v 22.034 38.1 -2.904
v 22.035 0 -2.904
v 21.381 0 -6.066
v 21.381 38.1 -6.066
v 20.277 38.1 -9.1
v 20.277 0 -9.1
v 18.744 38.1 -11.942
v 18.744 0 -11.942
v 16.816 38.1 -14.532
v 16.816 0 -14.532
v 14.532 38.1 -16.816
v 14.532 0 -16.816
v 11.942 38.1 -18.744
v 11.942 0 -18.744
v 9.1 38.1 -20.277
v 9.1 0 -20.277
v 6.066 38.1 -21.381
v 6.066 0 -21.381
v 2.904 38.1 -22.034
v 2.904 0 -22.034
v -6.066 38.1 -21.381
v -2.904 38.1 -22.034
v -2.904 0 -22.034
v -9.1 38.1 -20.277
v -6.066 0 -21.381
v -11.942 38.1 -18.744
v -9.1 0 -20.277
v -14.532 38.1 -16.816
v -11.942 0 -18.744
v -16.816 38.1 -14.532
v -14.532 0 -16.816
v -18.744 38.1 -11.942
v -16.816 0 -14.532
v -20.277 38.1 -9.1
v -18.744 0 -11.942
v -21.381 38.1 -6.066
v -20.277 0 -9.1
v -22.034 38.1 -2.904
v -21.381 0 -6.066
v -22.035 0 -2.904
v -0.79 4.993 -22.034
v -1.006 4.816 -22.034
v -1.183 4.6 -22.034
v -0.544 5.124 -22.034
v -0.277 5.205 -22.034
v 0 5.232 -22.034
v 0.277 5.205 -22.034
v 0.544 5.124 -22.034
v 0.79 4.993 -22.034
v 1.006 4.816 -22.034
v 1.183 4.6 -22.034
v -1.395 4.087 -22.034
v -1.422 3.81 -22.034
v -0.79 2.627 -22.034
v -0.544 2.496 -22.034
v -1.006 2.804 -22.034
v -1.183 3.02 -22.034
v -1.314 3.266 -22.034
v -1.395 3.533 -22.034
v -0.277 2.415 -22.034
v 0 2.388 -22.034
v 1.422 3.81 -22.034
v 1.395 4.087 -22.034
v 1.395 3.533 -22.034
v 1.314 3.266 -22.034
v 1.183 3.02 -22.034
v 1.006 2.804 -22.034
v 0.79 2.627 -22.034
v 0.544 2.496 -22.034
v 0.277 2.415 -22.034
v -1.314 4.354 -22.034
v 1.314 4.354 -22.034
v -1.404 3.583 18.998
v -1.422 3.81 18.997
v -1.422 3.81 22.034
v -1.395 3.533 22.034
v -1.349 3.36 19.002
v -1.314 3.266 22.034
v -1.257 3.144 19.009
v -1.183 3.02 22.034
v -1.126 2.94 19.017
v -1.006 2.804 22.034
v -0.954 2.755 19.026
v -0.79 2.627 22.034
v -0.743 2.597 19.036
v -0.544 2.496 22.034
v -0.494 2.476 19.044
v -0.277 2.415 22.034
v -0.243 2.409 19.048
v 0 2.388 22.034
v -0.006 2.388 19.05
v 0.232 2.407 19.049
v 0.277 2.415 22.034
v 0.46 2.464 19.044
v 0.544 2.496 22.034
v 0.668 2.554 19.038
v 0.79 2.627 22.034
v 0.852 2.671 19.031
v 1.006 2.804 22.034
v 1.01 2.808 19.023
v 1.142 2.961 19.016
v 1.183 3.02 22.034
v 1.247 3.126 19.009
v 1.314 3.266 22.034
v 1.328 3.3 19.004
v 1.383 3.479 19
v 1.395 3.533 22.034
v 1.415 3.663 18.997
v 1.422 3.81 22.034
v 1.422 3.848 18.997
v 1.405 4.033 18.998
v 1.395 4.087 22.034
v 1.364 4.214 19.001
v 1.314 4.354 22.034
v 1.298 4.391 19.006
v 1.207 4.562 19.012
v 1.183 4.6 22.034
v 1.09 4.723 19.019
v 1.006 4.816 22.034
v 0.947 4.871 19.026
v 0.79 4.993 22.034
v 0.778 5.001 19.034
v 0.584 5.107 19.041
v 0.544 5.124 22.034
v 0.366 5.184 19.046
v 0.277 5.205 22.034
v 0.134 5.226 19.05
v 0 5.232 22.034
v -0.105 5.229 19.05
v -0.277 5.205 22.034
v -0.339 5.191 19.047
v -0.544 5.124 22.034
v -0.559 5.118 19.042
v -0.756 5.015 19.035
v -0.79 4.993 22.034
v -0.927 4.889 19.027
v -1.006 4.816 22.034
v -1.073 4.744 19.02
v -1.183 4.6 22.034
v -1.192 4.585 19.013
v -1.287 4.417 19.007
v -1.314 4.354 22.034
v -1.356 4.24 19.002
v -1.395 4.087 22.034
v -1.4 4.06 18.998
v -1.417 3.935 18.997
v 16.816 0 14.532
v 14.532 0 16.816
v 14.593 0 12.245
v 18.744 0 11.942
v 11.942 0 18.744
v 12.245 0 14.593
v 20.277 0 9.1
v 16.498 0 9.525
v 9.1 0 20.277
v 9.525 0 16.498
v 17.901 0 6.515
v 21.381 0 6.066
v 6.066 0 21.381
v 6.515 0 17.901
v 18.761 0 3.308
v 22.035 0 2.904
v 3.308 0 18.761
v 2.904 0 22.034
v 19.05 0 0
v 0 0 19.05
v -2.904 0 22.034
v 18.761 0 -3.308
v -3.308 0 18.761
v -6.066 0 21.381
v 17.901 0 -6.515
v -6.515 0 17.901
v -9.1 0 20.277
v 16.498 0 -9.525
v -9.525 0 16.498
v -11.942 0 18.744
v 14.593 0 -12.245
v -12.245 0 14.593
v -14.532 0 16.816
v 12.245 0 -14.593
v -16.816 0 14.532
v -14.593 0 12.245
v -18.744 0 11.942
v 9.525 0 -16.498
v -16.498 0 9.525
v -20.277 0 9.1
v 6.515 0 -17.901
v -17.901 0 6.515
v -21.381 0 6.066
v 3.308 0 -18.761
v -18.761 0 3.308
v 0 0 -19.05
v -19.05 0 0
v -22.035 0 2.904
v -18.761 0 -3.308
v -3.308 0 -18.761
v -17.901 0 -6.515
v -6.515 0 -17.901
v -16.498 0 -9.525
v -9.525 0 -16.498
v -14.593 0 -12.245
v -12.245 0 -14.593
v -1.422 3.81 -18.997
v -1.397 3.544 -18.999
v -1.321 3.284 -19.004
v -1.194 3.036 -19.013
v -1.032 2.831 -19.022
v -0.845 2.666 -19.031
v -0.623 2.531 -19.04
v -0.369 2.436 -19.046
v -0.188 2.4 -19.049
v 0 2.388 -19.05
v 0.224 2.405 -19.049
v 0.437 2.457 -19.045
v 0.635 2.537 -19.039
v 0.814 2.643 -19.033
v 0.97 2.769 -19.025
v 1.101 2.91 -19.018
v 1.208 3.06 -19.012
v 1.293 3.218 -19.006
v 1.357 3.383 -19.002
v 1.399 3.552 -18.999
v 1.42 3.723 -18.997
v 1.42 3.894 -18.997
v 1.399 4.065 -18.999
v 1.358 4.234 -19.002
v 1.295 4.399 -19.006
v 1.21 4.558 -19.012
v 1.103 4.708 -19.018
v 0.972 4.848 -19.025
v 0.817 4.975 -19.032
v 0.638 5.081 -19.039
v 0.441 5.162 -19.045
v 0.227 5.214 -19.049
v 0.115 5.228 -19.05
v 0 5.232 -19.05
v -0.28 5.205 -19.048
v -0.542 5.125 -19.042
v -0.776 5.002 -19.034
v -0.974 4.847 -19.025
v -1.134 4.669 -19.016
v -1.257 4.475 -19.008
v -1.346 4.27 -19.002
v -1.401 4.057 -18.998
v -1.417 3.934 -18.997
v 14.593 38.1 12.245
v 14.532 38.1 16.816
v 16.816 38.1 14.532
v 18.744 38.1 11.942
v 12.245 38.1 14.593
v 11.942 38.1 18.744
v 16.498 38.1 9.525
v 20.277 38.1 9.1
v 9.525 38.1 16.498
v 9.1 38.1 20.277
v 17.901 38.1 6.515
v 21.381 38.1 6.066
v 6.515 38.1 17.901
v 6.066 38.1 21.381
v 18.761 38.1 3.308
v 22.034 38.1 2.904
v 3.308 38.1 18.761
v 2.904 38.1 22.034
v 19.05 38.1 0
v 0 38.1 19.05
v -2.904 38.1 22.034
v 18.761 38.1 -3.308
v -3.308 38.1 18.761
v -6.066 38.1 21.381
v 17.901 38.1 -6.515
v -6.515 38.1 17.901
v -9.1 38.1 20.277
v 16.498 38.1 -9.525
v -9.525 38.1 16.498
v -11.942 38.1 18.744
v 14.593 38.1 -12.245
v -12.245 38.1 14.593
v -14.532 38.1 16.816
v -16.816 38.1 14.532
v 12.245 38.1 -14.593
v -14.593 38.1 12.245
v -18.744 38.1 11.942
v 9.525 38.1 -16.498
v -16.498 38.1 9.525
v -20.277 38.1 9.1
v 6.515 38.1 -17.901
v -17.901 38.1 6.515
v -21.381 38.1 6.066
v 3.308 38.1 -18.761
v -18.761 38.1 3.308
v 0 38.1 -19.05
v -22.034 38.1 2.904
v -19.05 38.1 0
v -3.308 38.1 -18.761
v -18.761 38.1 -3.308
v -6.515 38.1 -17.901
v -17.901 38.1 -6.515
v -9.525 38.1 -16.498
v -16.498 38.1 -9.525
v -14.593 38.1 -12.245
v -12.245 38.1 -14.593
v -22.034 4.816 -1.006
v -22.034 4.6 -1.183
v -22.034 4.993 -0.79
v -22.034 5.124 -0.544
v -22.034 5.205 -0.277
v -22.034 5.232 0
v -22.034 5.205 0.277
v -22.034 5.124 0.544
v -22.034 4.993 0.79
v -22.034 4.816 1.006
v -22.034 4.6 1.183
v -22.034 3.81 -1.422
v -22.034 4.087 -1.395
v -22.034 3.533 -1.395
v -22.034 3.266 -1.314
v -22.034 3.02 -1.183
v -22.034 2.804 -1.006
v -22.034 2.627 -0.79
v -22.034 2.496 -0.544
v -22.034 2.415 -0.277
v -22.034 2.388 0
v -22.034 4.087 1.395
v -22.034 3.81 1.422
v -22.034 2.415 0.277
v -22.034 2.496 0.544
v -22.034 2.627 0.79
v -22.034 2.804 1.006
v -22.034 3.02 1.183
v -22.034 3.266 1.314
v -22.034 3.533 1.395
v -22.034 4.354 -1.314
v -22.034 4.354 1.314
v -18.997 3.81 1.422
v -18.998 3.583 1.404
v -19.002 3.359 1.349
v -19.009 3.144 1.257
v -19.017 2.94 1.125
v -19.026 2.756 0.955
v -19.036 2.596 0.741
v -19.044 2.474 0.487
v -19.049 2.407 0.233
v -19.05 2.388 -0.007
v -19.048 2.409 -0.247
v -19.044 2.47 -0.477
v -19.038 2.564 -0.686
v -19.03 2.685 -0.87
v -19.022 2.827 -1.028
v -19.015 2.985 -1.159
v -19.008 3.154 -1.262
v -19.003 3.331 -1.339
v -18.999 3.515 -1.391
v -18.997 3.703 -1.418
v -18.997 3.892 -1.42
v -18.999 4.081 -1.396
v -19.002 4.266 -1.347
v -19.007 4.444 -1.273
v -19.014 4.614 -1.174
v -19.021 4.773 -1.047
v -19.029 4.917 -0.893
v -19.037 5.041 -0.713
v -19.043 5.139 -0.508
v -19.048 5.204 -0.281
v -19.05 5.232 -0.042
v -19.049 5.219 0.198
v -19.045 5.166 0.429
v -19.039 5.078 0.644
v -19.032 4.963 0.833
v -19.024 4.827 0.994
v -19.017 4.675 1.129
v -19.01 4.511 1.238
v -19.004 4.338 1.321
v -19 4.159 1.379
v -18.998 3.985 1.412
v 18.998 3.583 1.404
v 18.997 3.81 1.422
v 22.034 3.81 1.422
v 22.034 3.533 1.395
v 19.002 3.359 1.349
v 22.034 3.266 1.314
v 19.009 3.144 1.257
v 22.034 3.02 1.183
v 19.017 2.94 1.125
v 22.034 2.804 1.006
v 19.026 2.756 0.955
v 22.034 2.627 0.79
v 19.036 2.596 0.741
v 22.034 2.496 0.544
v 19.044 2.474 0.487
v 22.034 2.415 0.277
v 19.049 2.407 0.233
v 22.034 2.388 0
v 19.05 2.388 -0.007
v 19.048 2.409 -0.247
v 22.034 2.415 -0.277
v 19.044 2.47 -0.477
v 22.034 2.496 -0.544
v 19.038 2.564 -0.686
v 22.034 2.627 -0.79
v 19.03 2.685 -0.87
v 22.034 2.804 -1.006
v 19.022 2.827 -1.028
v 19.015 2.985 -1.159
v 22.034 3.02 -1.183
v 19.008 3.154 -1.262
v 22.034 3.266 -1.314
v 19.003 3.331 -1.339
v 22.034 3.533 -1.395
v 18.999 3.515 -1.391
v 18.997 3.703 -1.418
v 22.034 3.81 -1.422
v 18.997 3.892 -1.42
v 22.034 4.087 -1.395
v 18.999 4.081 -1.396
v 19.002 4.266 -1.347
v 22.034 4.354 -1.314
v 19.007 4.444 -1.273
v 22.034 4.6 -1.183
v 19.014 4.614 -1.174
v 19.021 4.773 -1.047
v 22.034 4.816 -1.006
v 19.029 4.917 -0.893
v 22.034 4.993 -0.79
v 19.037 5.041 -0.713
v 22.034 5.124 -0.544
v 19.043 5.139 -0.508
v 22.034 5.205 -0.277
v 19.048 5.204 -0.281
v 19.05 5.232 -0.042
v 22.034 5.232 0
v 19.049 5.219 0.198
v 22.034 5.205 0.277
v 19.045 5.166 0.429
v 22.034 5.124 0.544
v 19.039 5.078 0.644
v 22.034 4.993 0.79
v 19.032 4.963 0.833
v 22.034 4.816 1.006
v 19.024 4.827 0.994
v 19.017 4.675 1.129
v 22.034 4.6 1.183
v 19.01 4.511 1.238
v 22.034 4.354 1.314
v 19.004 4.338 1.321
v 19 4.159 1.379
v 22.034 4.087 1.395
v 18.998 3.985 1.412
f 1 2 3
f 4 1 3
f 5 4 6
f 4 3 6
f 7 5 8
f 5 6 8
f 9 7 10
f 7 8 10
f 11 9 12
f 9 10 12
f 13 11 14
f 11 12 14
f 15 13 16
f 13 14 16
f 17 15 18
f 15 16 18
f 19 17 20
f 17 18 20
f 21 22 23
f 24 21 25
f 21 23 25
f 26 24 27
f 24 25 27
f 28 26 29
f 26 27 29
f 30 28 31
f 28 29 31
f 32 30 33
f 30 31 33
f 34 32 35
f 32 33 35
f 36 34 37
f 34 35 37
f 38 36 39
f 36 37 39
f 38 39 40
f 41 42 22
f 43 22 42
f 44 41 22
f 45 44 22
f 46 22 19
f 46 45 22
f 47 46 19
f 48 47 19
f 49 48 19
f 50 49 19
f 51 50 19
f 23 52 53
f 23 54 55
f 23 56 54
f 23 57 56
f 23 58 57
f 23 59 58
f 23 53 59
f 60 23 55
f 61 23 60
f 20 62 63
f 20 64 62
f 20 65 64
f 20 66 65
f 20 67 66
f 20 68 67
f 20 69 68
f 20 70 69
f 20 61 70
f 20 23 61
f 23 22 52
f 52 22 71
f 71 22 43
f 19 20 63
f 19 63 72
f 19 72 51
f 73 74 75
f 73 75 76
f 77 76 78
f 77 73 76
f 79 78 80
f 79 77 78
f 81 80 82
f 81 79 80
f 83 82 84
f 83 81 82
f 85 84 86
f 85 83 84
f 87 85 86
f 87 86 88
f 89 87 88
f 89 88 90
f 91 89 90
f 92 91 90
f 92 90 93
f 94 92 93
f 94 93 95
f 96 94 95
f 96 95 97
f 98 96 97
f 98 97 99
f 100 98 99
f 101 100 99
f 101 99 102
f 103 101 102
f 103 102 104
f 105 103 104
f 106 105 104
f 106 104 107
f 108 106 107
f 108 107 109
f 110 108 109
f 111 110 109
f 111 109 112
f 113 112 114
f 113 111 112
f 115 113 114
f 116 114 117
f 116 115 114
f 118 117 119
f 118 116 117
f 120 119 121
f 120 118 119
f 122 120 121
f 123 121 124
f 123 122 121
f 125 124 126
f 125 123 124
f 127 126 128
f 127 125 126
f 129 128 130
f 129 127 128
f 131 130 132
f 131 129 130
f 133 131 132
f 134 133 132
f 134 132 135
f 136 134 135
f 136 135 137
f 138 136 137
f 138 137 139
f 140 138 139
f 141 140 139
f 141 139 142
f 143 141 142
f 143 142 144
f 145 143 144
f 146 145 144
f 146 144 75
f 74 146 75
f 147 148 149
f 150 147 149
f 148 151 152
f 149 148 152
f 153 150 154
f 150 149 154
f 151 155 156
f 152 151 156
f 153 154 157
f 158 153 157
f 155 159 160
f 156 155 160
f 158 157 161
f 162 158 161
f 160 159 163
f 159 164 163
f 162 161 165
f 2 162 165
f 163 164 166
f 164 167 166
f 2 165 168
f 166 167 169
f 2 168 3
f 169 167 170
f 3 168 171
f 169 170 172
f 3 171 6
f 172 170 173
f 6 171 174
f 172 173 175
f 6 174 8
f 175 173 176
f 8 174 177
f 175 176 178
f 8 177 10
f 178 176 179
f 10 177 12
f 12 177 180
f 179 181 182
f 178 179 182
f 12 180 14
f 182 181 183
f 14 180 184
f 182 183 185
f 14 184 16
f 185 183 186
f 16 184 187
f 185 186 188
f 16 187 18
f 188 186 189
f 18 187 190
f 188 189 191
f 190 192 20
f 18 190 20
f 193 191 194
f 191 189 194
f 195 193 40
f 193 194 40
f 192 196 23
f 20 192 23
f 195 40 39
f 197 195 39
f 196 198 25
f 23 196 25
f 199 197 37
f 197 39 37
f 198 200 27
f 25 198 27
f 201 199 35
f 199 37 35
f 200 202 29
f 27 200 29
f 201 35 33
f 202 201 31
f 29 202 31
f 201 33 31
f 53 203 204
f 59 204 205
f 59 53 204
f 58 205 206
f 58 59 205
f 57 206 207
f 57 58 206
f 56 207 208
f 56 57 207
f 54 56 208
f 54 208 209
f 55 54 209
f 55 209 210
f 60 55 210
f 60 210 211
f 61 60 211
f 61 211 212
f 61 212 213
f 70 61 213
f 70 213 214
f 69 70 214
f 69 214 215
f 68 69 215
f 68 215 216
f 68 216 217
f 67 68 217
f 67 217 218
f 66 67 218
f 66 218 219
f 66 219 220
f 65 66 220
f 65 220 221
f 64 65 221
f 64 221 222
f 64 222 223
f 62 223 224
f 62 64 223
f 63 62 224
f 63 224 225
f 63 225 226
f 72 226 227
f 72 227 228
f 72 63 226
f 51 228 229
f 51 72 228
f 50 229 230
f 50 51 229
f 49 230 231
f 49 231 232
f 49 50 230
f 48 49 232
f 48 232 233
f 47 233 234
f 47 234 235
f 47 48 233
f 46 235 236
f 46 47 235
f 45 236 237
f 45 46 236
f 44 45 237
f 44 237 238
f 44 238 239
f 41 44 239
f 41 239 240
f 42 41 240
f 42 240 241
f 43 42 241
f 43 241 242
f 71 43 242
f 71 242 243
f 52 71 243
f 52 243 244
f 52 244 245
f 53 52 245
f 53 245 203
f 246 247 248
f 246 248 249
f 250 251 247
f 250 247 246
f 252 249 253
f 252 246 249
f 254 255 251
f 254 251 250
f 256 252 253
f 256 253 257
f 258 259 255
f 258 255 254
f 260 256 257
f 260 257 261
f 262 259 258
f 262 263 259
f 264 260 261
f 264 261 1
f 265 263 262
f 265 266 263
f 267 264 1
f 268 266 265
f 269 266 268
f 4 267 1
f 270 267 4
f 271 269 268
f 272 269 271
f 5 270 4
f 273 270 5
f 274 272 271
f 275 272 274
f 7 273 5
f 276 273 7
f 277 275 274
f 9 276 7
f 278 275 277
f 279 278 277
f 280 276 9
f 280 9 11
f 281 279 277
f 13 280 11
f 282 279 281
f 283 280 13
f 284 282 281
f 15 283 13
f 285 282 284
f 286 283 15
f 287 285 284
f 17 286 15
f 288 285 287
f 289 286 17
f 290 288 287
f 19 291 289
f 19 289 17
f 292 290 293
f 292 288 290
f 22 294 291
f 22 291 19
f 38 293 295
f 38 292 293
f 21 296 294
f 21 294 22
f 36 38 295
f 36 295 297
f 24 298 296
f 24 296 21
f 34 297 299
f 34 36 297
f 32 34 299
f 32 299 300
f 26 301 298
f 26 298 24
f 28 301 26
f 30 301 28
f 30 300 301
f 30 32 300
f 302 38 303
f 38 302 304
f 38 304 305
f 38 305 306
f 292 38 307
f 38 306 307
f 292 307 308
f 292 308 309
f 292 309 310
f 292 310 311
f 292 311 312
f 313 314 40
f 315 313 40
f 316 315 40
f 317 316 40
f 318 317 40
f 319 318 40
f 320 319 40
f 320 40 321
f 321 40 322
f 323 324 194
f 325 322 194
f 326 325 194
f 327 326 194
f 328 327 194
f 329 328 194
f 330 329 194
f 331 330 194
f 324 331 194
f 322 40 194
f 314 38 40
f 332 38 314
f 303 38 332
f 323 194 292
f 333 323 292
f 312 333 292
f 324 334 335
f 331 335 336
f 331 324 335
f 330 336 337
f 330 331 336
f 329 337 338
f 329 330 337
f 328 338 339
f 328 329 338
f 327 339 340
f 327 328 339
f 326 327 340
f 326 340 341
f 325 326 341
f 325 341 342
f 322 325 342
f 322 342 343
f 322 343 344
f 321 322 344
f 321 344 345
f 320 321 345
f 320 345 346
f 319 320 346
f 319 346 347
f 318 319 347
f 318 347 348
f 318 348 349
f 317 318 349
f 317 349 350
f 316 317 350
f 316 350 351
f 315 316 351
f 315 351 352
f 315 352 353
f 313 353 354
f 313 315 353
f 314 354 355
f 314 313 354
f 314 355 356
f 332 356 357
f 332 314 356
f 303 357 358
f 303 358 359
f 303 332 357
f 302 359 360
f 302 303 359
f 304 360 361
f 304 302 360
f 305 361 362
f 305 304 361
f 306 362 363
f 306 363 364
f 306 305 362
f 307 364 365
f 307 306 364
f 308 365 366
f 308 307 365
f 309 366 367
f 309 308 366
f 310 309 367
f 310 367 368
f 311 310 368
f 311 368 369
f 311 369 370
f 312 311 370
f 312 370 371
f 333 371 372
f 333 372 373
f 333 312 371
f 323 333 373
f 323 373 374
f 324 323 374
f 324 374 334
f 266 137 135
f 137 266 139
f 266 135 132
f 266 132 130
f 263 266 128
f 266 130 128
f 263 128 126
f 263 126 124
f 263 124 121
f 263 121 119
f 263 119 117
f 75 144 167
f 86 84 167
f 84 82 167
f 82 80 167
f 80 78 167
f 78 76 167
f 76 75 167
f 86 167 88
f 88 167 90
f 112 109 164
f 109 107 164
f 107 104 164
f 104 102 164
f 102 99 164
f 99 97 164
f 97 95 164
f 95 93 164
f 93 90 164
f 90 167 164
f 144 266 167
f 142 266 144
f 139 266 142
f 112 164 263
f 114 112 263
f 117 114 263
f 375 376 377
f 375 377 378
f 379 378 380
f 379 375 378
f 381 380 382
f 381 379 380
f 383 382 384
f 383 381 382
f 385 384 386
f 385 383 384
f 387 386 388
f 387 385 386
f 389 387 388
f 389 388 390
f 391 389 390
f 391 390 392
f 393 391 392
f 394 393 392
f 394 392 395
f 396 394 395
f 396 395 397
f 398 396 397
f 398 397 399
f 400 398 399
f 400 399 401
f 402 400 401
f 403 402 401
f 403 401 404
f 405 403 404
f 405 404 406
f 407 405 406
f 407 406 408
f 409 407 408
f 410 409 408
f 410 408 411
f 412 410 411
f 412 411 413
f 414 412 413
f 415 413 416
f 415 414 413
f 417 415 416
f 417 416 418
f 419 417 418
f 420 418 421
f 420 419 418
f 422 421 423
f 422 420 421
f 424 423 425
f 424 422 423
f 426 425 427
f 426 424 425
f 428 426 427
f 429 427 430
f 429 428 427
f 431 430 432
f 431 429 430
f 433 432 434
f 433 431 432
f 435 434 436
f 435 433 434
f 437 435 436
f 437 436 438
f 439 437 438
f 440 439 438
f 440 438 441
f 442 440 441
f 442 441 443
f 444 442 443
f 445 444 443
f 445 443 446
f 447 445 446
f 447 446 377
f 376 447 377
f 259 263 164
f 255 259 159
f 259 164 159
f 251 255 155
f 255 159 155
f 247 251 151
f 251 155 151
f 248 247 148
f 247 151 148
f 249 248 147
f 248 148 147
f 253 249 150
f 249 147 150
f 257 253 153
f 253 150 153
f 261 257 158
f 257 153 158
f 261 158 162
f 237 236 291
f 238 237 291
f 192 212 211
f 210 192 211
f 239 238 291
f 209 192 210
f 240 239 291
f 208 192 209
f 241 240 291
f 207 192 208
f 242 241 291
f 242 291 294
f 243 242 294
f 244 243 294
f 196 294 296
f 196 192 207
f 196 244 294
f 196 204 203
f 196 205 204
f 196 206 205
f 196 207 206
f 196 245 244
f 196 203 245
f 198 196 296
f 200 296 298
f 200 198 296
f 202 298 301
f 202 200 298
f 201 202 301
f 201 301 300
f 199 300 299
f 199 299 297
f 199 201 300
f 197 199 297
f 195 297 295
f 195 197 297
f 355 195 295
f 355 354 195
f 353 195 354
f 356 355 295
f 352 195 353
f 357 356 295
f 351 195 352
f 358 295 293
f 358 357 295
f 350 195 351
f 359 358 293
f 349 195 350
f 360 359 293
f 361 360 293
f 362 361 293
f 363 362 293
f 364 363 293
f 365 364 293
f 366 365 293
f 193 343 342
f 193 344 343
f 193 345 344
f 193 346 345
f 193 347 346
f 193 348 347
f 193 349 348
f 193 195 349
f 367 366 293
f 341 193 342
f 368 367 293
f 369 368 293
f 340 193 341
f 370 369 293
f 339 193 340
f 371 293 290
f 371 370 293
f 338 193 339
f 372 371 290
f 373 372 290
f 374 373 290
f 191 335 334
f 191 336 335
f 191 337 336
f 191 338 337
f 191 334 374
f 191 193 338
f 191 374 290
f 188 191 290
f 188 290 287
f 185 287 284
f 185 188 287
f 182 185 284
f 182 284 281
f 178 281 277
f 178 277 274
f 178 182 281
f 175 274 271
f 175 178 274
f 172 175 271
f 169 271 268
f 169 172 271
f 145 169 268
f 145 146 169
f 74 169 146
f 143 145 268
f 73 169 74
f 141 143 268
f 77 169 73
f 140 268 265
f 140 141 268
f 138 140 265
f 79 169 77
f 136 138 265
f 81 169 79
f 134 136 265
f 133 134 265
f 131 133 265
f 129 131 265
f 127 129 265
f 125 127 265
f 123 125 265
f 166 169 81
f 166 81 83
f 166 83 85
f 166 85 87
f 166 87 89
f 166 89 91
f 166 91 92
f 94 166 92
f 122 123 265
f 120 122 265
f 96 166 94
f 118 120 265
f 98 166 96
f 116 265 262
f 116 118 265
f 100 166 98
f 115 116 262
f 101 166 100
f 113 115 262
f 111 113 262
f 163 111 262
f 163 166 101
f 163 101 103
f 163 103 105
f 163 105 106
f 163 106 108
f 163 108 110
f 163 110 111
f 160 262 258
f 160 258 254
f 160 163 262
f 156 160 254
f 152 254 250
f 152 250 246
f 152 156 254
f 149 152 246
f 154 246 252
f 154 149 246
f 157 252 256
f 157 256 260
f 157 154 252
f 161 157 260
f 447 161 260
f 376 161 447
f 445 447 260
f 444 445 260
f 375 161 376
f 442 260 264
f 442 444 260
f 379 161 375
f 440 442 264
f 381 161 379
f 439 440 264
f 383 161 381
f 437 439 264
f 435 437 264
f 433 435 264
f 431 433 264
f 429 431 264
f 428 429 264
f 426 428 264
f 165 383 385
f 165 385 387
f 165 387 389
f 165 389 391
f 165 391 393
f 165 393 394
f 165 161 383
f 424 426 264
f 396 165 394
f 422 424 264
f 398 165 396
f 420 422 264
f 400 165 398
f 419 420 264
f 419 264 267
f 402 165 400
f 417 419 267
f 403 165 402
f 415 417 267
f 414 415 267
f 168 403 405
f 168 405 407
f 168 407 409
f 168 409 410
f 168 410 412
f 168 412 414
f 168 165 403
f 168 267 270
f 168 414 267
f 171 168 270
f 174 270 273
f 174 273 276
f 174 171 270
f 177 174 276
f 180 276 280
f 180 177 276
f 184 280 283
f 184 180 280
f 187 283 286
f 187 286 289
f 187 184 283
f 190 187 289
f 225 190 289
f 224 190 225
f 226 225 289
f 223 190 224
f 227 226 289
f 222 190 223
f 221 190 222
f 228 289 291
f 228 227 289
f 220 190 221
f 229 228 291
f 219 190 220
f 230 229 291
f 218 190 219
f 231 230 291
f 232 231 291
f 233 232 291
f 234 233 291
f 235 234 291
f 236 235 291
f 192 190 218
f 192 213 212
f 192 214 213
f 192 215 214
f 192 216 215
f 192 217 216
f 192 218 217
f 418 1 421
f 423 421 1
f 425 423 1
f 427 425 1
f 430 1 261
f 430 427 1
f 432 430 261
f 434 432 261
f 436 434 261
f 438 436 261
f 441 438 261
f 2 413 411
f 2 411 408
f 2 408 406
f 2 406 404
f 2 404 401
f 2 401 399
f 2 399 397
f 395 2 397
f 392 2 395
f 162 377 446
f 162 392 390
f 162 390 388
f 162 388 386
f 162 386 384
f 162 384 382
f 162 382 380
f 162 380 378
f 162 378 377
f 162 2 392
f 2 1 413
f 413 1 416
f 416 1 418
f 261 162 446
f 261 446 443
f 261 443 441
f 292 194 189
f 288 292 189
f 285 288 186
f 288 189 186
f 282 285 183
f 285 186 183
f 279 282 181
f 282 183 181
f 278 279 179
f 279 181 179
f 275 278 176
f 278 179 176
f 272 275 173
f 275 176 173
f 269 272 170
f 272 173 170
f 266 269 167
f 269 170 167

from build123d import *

# Parameters (mm, degrees)
SKETCH1_R               = 22.225
SKETCH1_R_2             = 19.05
BOSS_EXTRUDE1_DEPTH     = 38.1
CUT_EXTRUDE1_DEPTH      = 43.18
CUT_EXTRUDE1_DEPTH_BACK = 43.18
SKETCH2_R               = 1.4224
CUT_EXTRUDE2_DEPTH      = 43.18
CUT_EXTRUDE2_DEPTH_BACK = 43.18
SKETCH3_R               = 1.4224
SKETCH4_W               = 49.025527768
SKETCH4_H               = 48.000320082
SKETCH4_W_2             = 44.069
SKETCH4_H_2             = 44.069
CUT_EXTRUDE3_DEPTH      = 43.18


with BuildPart() as part:
    # Sketch1 → Boss-Extrude1 (new body)
    with BuildSketch(Plane(origin=(0, 0, 0), x_dir=(1, 0, 0), z_dir=(0, 1, 0))):
        Circle(SKETCH1_R)
        Circle(SKETCH1_R_2, mode=Mode.SUBTRACT)
    extrude(amount=BOSS_EXTRUDE1_DEPTH)

    # Sketch2 → Cut-Extrude1 (cut, two sides: drawn at the far end of the back side and taken through both)
    with BuildSketch(Plane.XY.offset(-CUT_EXTRUDE1_DEPTH_BACK)):
        with Locations((0, 3.81)):
            Circle(SKETCH2_R)
    extrude(amount=CUT_EXTRUDE1_DEPTH + CUT_EXTRUDE1_DEPTH_BACK, mode=Mode.SUBTRACT)

    # Sketch3 → Cut-Extrude2 (cut, two sides: drawn at the far end of the back side and taken through both)
    with BuildSketch(Plane(origin=(0, 0, 0), x_dir=(0, 0, -1), z_dir=(1, 0, 0)).offset(-CUT_EXTRUDE2_DEPTH_BACK)):
        with Locations((0, 3.81)):
            Circle(SKETCH3_R)
    extrude(amount=CUT_EXTRUDE2_DEPTH + CUT_EXTRUDE2_DEPTH_BACK, mode=Mode.SUBTRACT)

    # Sketch4 → Cut-Extrude3 (cut)
    with BuildSketch(Plane.XZ):
        Rectangle(SKETCH4_W, SKETCH4_H)
        Rectangle(SKETCH4_W_2, SKETCH4_H_2, mode=Mode.SUBTRACT)
    extrude(amount=-CUT_EXTRUDE3_DEPTH, mode=Mode.SUBTRACT)


solid = part.part
